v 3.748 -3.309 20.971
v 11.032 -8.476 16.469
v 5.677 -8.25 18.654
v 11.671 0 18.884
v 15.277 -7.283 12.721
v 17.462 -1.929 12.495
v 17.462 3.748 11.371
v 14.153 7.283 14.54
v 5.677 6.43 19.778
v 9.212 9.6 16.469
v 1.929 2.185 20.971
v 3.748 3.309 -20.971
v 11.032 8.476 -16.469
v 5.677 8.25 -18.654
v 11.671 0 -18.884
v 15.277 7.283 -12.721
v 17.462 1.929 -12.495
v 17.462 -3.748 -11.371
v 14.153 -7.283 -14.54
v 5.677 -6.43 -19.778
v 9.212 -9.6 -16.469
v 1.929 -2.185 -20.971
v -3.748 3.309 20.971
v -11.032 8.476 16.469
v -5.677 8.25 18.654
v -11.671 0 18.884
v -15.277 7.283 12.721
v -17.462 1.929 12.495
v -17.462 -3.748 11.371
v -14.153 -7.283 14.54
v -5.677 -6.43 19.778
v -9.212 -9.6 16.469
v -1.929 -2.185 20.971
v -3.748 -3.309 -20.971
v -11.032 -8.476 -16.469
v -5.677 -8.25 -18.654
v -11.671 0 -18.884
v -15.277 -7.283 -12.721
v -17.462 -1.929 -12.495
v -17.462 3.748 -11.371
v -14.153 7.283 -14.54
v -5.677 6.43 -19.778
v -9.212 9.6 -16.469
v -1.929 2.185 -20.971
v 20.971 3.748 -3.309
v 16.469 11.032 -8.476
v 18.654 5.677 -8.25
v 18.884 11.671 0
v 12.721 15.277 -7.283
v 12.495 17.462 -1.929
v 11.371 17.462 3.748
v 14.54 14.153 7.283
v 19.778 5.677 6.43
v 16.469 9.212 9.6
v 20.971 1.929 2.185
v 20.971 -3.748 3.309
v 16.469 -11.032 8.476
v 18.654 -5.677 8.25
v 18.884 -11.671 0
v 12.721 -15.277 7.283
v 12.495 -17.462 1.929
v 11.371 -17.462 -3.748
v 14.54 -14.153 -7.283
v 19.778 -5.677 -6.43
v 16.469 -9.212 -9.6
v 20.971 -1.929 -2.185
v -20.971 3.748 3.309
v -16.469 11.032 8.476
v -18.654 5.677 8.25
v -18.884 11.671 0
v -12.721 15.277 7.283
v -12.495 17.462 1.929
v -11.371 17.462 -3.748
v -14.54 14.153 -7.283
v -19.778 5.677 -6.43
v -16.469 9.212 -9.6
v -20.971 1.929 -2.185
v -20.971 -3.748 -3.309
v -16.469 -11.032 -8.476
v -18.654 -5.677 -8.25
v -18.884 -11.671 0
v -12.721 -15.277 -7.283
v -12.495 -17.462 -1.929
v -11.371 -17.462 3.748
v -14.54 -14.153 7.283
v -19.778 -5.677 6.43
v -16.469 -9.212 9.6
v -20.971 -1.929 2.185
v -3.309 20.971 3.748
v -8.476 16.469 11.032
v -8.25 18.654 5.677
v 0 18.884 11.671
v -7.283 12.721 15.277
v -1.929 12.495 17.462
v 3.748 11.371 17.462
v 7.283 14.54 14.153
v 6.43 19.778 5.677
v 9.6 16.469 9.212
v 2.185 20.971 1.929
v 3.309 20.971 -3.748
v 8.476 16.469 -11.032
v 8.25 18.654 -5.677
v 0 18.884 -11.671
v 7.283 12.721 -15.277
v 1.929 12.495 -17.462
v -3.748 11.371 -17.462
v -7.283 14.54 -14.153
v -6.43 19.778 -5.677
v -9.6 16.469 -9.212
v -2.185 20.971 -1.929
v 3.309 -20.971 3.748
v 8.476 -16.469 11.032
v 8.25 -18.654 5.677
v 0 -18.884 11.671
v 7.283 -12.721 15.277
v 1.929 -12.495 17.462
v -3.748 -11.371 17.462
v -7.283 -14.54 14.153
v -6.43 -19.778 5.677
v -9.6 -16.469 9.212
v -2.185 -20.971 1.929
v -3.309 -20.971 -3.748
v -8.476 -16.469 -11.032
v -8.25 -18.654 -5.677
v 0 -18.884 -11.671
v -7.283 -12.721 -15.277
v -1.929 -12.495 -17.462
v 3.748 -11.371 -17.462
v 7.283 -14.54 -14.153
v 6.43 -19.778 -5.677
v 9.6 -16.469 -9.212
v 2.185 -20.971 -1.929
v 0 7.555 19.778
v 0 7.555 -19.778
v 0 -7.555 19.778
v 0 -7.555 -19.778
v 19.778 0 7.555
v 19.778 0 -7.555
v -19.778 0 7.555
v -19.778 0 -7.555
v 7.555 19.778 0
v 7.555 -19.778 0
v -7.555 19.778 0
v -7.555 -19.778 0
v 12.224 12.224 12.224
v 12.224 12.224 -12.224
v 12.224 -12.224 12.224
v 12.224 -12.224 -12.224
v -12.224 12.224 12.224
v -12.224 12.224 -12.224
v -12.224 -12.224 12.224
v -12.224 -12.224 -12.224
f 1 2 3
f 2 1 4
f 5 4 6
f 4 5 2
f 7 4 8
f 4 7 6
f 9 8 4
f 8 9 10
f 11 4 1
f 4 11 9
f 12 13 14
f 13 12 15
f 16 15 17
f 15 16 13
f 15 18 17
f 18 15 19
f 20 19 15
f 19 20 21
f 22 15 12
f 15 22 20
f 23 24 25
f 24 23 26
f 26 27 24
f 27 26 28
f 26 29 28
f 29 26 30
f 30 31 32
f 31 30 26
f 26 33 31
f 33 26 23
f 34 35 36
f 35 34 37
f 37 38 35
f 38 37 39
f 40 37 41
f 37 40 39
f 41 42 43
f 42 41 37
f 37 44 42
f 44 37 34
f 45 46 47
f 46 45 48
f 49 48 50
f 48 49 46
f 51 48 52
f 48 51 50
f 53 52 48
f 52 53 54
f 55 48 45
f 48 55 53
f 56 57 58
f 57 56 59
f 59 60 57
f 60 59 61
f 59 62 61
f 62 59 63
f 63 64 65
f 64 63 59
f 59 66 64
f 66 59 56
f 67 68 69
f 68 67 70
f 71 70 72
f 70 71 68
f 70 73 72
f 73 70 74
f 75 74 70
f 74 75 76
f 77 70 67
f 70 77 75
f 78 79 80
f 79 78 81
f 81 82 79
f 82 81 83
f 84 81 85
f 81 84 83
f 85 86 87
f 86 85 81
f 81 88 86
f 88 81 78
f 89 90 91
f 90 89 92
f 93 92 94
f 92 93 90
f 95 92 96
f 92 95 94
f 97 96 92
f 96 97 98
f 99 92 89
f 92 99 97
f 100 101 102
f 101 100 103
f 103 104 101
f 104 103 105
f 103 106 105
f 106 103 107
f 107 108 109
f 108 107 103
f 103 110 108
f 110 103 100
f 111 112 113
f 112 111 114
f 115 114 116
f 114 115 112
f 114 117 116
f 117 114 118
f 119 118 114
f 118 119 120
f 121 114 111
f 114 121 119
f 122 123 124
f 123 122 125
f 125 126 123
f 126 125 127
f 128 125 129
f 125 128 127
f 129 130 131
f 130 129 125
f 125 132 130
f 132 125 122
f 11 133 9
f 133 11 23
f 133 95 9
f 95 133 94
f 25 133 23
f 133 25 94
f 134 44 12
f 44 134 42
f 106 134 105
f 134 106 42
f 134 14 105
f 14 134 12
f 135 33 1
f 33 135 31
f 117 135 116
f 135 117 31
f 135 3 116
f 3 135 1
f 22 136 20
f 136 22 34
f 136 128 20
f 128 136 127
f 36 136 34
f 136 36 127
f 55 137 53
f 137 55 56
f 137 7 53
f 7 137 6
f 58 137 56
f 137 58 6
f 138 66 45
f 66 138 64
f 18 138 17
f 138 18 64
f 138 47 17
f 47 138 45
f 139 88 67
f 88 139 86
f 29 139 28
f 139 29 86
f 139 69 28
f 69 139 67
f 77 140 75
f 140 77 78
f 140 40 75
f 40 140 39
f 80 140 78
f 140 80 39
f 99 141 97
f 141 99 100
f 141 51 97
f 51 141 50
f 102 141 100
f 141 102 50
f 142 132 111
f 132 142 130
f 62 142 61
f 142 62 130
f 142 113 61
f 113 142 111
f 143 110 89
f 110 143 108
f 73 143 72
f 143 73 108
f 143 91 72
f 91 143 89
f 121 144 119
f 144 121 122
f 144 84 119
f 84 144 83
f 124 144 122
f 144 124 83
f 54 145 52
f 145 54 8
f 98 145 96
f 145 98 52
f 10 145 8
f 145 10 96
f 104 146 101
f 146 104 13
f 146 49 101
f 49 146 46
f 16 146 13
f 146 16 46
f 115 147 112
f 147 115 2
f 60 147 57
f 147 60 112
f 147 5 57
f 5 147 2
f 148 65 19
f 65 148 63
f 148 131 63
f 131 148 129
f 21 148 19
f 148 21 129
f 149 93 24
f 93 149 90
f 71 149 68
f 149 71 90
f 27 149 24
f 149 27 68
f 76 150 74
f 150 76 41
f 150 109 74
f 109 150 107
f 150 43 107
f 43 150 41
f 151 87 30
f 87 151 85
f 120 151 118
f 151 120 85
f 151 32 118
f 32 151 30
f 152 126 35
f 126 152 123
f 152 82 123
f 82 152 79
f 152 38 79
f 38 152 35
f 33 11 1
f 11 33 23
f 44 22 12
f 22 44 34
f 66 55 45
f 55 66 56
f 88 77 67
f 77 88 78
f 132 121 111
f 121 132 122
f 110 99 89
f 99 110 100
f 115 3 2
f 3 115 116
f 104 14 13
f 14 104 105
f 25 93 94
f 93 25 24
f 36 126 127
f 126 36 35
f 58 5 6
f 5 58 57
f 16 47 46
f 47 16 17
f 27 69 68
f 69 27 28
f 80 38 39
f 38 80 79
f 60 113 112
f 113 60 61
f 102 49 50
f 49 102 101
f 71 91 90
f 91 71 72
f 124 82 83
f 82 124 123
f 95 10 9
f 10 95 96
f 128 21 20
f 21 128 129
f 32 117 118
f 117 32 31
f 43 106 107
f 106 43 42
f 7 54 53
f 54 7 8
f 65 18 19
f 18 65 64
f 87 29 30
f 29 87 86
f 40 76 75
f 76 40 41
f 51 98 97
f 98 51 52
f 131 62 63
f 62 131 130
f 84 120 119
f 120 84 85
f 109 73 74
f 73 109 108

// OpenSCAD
// Joined Snub Dodecahedron (laevo)
//   coords via: http://dmccooey.com/polyhedra/JoinedLsnubDodecahedron.html
//
scaling_factor = 10;

phi = (1 + sqrt(5)) / 2;
x = pow((phi + sqrt(phi - 5 /27)) / 2, 1 / 3) +
    pow(((phi - sqrt(phi - 5 / 27)) / 2), 1 / 3);

C0  = phi * sqrt(3 - (x^2)) / 2;
C1  = phi * sqrt((x - 1 - (1 / x)) * phi) / (2 * x);
C2  = x * phi * sqrt(3 - (x^2)) / 2;
C3  = phi * sqrt((x - 1 - (1 / x)) * phi) / 2;
C4  = (x^2) * phi * sqrt(3 - (x^2)) / 2;
C5  = x * phi * sqrt((x - 1 - (1 / x)) * phi) / 2;
C6  = phi * sqrt(1 - x + (1 + phi) / x) / 2;
C7  = sqrt(x * (x + phi) + 1) / (2 * x);
C8  = sqrt((x + 2) * phi + 2) / (2 * x);
C9  = phi * sqrt(x + 1 - phi) / 2;
C10 = sqrt(-(x^2) * (2 + phi) + x * (1 + 3 * phi) + 4) / 2;
C11 = (1 + phi) * sqrt(1 + (1 / x)) / (2 * x);
C12 = (x^2) * phi * sqrt((x - 1 - (1 / x)) * phi) / 2;
C13 = sqrt(2 + 3 * phi - 2 * x + (3 / x)) / 2;
C14 = sqrt((x^2)*(392 + 225*phi) + x*(249 + 670*phi) + (470 + 157*phi))/62;
C15 = phi * sqrt(x * (x + phi) + 1) / (2 * x);
C16 = x * phi * sqrt(1 - x + (1 + phi) / x) / 2;
C17 = phi * sqrt((x^2) + x + 1 + phi) / (2 * x);
C18 = sqrt((x + 2) * phi + 2) / 2;
C19 = x * sqrt(x * (1 + phi) - phi) / 2;
C20 = phi * sqrt((x^2) + 2 * x * phi + 2) / (2 * x);
C21 = sqrt((x^2) * (1 + 2 * phi) - phi) / 2;
C22 = phi * sqrt((x^2) + x) / 2;
C23 = (phi^3) * sqrt(x * (x + phi) + 1) / (2 * (x^2));
C24 = sqrt((x^2)*(617 + 842*phi) + x*(919 + 1589*phi) + (627 + 784*phi))/62;
C25 = (phi^2) * sqrt(x * (x + phi) + 1) / (2 * x);
C26 = phi * sqrt(x * (x + phi) + 1) / 2;

vertices = [
 [  C3,  -C2,  C26], [  C3,   C2, -C26], [ -C3,   C2,  C26], [ -C3,  -C2, -C26],
 [ C26,  -C3,   C2], [ C26,   C3,  -C2], [-C26,   C3,   C2], [-C26,  -C3,  -C2],
 [  C2, -C26,   C3], [  C2,  C26,  -C3], [ -C2,  C26,   C3], [ -C2, -C26,  -C3],
 [  C0,   C1,  C26], [  C0,  -C1, -C26], [ -C0,  -C1,  C26], [ -C0,   C1, -C26],
 [ C26,   C0,   C1], [ C26,  -C0,  -C1], [-C26,  -C0,   C1], [-C26,   C0,  -C1],
 [  C1,  C26,   C0], [  C1, -C26,  -C0], [ -C1, -C26,   C0], [ -C1,  C26,  -C0],
 [ 0.0,   C7,  C25], [ 0.0,   C7, -C25], [ 0.0,  -C7,  C25], [ 0.0,  -C7, -C25],
 [ C25,  0.0,   C7], [ C25,  0.0,  -C7], [-C25,  0.0,   C7], [-C25,  0.0,  -C7],
 [  C7,  C25,  0.0], [  C7, -C25,  0.0], [ -C7,  C25,  0.0], [ -C7, -C25,  0.0],
 [  C4,   C5,  C25], [  C4,  -C5, -C25], [ -C4,  -C5,  C25], [ -C4,   C5, -C25],
 [ C25,   C4,   C5], [ C25,  -C4,  -C5], [-C25,  -C4,   C5], [-C25,   C4,  -C5],
 [  C5,  C25,   C4], [  C5, -C25,  -C4], [ -C5, -C25,   C4], [ -C5,  C25,  -C4],
 [ C14,  0.0,  C24], [ C14,  0.0, -C24], [-C14,  0.0,  C24], [-C14,  0.0, -C24],
 [ C24,  C14,  0.0], [ C24, -C14,  0.0], [-C24,  C14,  0.0], [-C24, -C14,  0.0],
 [ 0.0,  C24,  C14], [ 0.0,  C24, -C14], [ 0.0, -C24,  C14], [ 0.0, -C24, -C14],
 [  C4,  -C8,  C23], [  C4,   C8, -C23], [ -C4,   C8,  C23], [ -C4,  -C8, -C23],
 [ C23,  -C4,   C8], [ C23,   C4,  -C8], [-C23,   C4,   C8], [-C23,  -C4,  -C8],
 [  C8, -C23,   C4], [  C8,  C23,  -C4], [ -C8,  C23,   C4], [ -C8, -C23,  -C4],
 [  C0, -C16,  C22], [  C0,  C16, -C22], [ -C0,  C16,  C22], [ -C0, -C16, -C22],
 [ C22,  -C0,  C16], [ C22,   C0, -C16], [-C22,   C0,  C16], [-C22,  -C0, -C16],
 [ C16, -C22,   C0], [ C16,  C22,  -C0], [-C16,  C22,   C0], [-C16, -C22,  -C0],
 [  C3,  C13,  C22], [  C3, -C13, -C22], [ -C3, -C13,  C22], [ -C3,  C13, -C22],
 [ C22,   C3,  C13], [ C22,  -C3, -C13], [-C22,  -C3,  C13], [-C22,   C3, -C13],
 [ C13,  C22,   C3], [ C13, -C22,  -C3], [-C13, -C22,   C3], [-C13,  C22,  -C3],
 [ C12,  -C9,  C21], [ C12,   C9, -C21], [-C12,   C9,  C21], [-C12,  -C9, -C21],
 [ C21, -C12,   C9], [ C21,  C12,  -C9], [-C21,  C12,   C9], [-C21, -C12,  -C9],
 [  C9, -C21,  C12], [  C9,  C21, -C12], [ -C9,  C21,  C12], [ -C9, -C21, -C12],
 [ C10,  C11,  C21], [ C10, -C11, -C21], [-C10, -C11,  C21], [-C10,  C11, -C21],
 [ C21,  C10,  C11], [ C21, -C10, -C11], [-C21, -C10,  C11], [-C21,  C10, -C11],
 [ C11,  C21,  C10], [ C11, -C21, -C10], [-C11, -C21,  C10], [-C11,  C21, -C10],
 [  C6, -C17,  C20], [  C6,  C17, -C20], [ -C6,  C17,  C20], [ -C6, -C17, -C20],
 [ C20,  -C6,  C17], [ C20,   C6, -C17], [-C20,   C6,  C17], [-C20,  -C6, -C17],
 [ C17, -C20,   C6], [ C17,  C20,  -C6], [-C17,  C20,   C6], [-C17, -C20,  -C6],
 [ C18,   C6,  C19], [ C18,  -C6, -C19], [-C18,  -C6,  C19], [-C18,   C6, -C19],
 [ C19,  C18,   C6], [ C19, -C18,  -C6], [-C19, -C18,   C6], [-C19,  C18,  -C6],
 [  C6,  C19,  C18], [  C6, -C19, -C18], [ -C6, -C19,  C18], [ -C6,  C19, -C18],
 [ C15,  C15,  C15], [ C15,  C15, -C15], [ C15, -C15,  C15], [ C15, -C15, -C15],
 [-C15,  C15,  C15], [-C15,  C15, -C15], [-C15, -C15,  C15], [-C15, -C15, -C15]
];

faces = [
  [ 48,   0,  60,  96], [ 48,  96, 124,  76], [ 48,  76,  88, 132],
  [ 48, 132, 108,  36], [ 48,  36,  12,   0],
  [ 49,   1,  61,  97], [ 49,  97, 125,  77], [ 49,  77,  89, 133],
  [ 49, 133, 109,  37], [ 49,  37,  13,   1],
  [ 50,   2,  62,  98], [ 50,  98, 126,  78], [ 50,  78,  90, 134],
  [ 50, 134, 110,  38], [ 50,  38,  14,   2],
  [ 51,   3,  63,  99], [ 51,  99, 127,  79], [ 51,  79,  91, 135],
  [ 51, 135, 111,  39], [ 51,  39,  15,   3],
  [ 52,   5,  65, 101], [ 52, 101, 129,  81], [ 52,  81,  92, 136],
  [ 52, 136, 112,  40], [ 52,  40,  16,   5],
  [ 53,   4,  64, 100], [ 53, 100, 128,  80], [ 53,  80,  93, 137],
  [ 53, 137, 113,  41], [ 53,  41,  17,   4],
  [ 54,   6,  66, 102], [ 54, 102, 130,  82], [ 54,  82,  95, 139],
  [ 54, 139, 115,  43], [ 54,  43,  19,   6],
  [ 55,   7,  67, 103], [ 55, 103, 131,  83], [ 55,  83,  94, 138],
  [ 55, 138, 114,  42], [ 55,  42,  18,   7],
  [ 56,  10,  70, 106], [ 56, 106, 122,  74], [ 56,  74,  84, 140],
  [ 56, 140, 116,  44], [ 56,  44,  20,  10],
  [ 57,   9,  69, 105], [ 57, 105, 121,  73], [ 57,  73,  87, 143],
  [ 57, 143, 119,  47], [ 57,  47,  23,   9],
  [ 58,   8,  68, 104], [ 58, 104, 120,  72], [ 58,  72,  86, 142],
  [ 58, 142, 118,  46], [ 58,  46,  22,   8],
  [ 59,  11,  71, 107], [ 59, 107, 123,  75], [ 59,  75,  85, 141],
  [ 59, 141, 117,  45], [ 59,  45,  21,  11],
  [ 24,   2,  12,  36], [ 24,  36,  84,  74], [ 24,  74,  62,   2],
  [ 25,   1,  15,  39], [ 25,  39,  87,  73], [ 25,  73,  61,   1],
  [ 26,   0,  14,  38], [ 26,  38,  86,  72], [ 26,  72,  60,   0],
  [ 27,   3,  13,  37], [ 27,  37,  85,  75], [ 27,  75,  63,   3],
  [ 28,   4,  16,  40], [ 28,  40,  88,  76], [ 28,  76,  64,   4],
  [ 29,   5,  17,  41], [ 29,  41,  89,  77], [ 29,  77,  65,   5],
  [ 30,   6,  18,  42], [ 30,  42,  90,  78], [ 30,  78,  66,   6],
  [ 31,   7,  19,  43], [ 31,  43,  91,  79], [ 31,  79,  67,   7],
  [ 32,   9,  20,  44], [ 32,  44,  92,  81], [ 32,  81,  69,   9],
  [ 33,   8,  21,  45], [ 33,  45,  93,  80], [ 33,  80,  68,   8],
  [ 34,  10,  23,  47], [ 34,  47,  95,  82], [ 34,  82,  70,  10],
  [ 35,  11,  22,  46], [ 35,  46,  94,  83], [ 35,  83,  71,  11],
  [144, 132, 112, 136], [144, 136, 116, 140], [144, 140, 108, 132],
  [145,  97, 121, 105], [145, 105, 129, 101], [145, 101, 125,  97],
  [146,  96, 120, 104], [146, 104, 128, 100], [146, 100, 124,  96],
  [147, 133, 113, 137], [147, 137, 117, 141], [147, 141, 109, 133],
  [148,  98, 122, 106], [148, 106, 130, 102], [148, 102, 126,  98],
  [149, 135, 115, 139], [149, 139, 119, 143], [149, 143, 111, 135],
  [150, 134, 114, 138], [150, 138, 118, 142], [150, 142, 110, 134],
  [151,  99, 123, 107], [151, 107, 131, 103], [151, 103, 127,  99],
  [  2,  14,   0,  12], [  3,  15,   1,  13],
  [  4,  17,   5,  16], [  7,  18,   6,  19],
  [  8,  22,  11,  21], [  9,  23,  10,  20],
  [ 72, 120,  96,  60], [ 73, 121,  97,  61],
  [ 74, 122,  98,  62], [ 75, 123,  99,  63],
  [ 76, 124, 100,  64], [ 77, 125, 101,  65],
  [ 78, 126, 102,  66], [ 79, 127, 103,  67],
  [ 80, 128, 104,  68], [ 81, 129, 105,  69],
  [ 82, 130, 106,  70], [ 83, 131, 107,  71],
  [ 84,  36, 108, 140], [ 85,  37, 109, 141],
  [ 86,  38, 110, 142], [ 87,  39, 111, 143],
  [ 88,  40, 112, 132], [ 89,  41, 113, 133],
  [ 90,  42, 114, 134], [ 91,  43, 115, 135],
  [ 92,  44, 116, 136], [ 93,  45, 117, 137],
  [ 94,  46, 118, 138], [ 95,  47, 119, 139]
];

scale(scaling_factor) {
  polyhedron(points=vertices, faces=faces, convexity=20);
}
